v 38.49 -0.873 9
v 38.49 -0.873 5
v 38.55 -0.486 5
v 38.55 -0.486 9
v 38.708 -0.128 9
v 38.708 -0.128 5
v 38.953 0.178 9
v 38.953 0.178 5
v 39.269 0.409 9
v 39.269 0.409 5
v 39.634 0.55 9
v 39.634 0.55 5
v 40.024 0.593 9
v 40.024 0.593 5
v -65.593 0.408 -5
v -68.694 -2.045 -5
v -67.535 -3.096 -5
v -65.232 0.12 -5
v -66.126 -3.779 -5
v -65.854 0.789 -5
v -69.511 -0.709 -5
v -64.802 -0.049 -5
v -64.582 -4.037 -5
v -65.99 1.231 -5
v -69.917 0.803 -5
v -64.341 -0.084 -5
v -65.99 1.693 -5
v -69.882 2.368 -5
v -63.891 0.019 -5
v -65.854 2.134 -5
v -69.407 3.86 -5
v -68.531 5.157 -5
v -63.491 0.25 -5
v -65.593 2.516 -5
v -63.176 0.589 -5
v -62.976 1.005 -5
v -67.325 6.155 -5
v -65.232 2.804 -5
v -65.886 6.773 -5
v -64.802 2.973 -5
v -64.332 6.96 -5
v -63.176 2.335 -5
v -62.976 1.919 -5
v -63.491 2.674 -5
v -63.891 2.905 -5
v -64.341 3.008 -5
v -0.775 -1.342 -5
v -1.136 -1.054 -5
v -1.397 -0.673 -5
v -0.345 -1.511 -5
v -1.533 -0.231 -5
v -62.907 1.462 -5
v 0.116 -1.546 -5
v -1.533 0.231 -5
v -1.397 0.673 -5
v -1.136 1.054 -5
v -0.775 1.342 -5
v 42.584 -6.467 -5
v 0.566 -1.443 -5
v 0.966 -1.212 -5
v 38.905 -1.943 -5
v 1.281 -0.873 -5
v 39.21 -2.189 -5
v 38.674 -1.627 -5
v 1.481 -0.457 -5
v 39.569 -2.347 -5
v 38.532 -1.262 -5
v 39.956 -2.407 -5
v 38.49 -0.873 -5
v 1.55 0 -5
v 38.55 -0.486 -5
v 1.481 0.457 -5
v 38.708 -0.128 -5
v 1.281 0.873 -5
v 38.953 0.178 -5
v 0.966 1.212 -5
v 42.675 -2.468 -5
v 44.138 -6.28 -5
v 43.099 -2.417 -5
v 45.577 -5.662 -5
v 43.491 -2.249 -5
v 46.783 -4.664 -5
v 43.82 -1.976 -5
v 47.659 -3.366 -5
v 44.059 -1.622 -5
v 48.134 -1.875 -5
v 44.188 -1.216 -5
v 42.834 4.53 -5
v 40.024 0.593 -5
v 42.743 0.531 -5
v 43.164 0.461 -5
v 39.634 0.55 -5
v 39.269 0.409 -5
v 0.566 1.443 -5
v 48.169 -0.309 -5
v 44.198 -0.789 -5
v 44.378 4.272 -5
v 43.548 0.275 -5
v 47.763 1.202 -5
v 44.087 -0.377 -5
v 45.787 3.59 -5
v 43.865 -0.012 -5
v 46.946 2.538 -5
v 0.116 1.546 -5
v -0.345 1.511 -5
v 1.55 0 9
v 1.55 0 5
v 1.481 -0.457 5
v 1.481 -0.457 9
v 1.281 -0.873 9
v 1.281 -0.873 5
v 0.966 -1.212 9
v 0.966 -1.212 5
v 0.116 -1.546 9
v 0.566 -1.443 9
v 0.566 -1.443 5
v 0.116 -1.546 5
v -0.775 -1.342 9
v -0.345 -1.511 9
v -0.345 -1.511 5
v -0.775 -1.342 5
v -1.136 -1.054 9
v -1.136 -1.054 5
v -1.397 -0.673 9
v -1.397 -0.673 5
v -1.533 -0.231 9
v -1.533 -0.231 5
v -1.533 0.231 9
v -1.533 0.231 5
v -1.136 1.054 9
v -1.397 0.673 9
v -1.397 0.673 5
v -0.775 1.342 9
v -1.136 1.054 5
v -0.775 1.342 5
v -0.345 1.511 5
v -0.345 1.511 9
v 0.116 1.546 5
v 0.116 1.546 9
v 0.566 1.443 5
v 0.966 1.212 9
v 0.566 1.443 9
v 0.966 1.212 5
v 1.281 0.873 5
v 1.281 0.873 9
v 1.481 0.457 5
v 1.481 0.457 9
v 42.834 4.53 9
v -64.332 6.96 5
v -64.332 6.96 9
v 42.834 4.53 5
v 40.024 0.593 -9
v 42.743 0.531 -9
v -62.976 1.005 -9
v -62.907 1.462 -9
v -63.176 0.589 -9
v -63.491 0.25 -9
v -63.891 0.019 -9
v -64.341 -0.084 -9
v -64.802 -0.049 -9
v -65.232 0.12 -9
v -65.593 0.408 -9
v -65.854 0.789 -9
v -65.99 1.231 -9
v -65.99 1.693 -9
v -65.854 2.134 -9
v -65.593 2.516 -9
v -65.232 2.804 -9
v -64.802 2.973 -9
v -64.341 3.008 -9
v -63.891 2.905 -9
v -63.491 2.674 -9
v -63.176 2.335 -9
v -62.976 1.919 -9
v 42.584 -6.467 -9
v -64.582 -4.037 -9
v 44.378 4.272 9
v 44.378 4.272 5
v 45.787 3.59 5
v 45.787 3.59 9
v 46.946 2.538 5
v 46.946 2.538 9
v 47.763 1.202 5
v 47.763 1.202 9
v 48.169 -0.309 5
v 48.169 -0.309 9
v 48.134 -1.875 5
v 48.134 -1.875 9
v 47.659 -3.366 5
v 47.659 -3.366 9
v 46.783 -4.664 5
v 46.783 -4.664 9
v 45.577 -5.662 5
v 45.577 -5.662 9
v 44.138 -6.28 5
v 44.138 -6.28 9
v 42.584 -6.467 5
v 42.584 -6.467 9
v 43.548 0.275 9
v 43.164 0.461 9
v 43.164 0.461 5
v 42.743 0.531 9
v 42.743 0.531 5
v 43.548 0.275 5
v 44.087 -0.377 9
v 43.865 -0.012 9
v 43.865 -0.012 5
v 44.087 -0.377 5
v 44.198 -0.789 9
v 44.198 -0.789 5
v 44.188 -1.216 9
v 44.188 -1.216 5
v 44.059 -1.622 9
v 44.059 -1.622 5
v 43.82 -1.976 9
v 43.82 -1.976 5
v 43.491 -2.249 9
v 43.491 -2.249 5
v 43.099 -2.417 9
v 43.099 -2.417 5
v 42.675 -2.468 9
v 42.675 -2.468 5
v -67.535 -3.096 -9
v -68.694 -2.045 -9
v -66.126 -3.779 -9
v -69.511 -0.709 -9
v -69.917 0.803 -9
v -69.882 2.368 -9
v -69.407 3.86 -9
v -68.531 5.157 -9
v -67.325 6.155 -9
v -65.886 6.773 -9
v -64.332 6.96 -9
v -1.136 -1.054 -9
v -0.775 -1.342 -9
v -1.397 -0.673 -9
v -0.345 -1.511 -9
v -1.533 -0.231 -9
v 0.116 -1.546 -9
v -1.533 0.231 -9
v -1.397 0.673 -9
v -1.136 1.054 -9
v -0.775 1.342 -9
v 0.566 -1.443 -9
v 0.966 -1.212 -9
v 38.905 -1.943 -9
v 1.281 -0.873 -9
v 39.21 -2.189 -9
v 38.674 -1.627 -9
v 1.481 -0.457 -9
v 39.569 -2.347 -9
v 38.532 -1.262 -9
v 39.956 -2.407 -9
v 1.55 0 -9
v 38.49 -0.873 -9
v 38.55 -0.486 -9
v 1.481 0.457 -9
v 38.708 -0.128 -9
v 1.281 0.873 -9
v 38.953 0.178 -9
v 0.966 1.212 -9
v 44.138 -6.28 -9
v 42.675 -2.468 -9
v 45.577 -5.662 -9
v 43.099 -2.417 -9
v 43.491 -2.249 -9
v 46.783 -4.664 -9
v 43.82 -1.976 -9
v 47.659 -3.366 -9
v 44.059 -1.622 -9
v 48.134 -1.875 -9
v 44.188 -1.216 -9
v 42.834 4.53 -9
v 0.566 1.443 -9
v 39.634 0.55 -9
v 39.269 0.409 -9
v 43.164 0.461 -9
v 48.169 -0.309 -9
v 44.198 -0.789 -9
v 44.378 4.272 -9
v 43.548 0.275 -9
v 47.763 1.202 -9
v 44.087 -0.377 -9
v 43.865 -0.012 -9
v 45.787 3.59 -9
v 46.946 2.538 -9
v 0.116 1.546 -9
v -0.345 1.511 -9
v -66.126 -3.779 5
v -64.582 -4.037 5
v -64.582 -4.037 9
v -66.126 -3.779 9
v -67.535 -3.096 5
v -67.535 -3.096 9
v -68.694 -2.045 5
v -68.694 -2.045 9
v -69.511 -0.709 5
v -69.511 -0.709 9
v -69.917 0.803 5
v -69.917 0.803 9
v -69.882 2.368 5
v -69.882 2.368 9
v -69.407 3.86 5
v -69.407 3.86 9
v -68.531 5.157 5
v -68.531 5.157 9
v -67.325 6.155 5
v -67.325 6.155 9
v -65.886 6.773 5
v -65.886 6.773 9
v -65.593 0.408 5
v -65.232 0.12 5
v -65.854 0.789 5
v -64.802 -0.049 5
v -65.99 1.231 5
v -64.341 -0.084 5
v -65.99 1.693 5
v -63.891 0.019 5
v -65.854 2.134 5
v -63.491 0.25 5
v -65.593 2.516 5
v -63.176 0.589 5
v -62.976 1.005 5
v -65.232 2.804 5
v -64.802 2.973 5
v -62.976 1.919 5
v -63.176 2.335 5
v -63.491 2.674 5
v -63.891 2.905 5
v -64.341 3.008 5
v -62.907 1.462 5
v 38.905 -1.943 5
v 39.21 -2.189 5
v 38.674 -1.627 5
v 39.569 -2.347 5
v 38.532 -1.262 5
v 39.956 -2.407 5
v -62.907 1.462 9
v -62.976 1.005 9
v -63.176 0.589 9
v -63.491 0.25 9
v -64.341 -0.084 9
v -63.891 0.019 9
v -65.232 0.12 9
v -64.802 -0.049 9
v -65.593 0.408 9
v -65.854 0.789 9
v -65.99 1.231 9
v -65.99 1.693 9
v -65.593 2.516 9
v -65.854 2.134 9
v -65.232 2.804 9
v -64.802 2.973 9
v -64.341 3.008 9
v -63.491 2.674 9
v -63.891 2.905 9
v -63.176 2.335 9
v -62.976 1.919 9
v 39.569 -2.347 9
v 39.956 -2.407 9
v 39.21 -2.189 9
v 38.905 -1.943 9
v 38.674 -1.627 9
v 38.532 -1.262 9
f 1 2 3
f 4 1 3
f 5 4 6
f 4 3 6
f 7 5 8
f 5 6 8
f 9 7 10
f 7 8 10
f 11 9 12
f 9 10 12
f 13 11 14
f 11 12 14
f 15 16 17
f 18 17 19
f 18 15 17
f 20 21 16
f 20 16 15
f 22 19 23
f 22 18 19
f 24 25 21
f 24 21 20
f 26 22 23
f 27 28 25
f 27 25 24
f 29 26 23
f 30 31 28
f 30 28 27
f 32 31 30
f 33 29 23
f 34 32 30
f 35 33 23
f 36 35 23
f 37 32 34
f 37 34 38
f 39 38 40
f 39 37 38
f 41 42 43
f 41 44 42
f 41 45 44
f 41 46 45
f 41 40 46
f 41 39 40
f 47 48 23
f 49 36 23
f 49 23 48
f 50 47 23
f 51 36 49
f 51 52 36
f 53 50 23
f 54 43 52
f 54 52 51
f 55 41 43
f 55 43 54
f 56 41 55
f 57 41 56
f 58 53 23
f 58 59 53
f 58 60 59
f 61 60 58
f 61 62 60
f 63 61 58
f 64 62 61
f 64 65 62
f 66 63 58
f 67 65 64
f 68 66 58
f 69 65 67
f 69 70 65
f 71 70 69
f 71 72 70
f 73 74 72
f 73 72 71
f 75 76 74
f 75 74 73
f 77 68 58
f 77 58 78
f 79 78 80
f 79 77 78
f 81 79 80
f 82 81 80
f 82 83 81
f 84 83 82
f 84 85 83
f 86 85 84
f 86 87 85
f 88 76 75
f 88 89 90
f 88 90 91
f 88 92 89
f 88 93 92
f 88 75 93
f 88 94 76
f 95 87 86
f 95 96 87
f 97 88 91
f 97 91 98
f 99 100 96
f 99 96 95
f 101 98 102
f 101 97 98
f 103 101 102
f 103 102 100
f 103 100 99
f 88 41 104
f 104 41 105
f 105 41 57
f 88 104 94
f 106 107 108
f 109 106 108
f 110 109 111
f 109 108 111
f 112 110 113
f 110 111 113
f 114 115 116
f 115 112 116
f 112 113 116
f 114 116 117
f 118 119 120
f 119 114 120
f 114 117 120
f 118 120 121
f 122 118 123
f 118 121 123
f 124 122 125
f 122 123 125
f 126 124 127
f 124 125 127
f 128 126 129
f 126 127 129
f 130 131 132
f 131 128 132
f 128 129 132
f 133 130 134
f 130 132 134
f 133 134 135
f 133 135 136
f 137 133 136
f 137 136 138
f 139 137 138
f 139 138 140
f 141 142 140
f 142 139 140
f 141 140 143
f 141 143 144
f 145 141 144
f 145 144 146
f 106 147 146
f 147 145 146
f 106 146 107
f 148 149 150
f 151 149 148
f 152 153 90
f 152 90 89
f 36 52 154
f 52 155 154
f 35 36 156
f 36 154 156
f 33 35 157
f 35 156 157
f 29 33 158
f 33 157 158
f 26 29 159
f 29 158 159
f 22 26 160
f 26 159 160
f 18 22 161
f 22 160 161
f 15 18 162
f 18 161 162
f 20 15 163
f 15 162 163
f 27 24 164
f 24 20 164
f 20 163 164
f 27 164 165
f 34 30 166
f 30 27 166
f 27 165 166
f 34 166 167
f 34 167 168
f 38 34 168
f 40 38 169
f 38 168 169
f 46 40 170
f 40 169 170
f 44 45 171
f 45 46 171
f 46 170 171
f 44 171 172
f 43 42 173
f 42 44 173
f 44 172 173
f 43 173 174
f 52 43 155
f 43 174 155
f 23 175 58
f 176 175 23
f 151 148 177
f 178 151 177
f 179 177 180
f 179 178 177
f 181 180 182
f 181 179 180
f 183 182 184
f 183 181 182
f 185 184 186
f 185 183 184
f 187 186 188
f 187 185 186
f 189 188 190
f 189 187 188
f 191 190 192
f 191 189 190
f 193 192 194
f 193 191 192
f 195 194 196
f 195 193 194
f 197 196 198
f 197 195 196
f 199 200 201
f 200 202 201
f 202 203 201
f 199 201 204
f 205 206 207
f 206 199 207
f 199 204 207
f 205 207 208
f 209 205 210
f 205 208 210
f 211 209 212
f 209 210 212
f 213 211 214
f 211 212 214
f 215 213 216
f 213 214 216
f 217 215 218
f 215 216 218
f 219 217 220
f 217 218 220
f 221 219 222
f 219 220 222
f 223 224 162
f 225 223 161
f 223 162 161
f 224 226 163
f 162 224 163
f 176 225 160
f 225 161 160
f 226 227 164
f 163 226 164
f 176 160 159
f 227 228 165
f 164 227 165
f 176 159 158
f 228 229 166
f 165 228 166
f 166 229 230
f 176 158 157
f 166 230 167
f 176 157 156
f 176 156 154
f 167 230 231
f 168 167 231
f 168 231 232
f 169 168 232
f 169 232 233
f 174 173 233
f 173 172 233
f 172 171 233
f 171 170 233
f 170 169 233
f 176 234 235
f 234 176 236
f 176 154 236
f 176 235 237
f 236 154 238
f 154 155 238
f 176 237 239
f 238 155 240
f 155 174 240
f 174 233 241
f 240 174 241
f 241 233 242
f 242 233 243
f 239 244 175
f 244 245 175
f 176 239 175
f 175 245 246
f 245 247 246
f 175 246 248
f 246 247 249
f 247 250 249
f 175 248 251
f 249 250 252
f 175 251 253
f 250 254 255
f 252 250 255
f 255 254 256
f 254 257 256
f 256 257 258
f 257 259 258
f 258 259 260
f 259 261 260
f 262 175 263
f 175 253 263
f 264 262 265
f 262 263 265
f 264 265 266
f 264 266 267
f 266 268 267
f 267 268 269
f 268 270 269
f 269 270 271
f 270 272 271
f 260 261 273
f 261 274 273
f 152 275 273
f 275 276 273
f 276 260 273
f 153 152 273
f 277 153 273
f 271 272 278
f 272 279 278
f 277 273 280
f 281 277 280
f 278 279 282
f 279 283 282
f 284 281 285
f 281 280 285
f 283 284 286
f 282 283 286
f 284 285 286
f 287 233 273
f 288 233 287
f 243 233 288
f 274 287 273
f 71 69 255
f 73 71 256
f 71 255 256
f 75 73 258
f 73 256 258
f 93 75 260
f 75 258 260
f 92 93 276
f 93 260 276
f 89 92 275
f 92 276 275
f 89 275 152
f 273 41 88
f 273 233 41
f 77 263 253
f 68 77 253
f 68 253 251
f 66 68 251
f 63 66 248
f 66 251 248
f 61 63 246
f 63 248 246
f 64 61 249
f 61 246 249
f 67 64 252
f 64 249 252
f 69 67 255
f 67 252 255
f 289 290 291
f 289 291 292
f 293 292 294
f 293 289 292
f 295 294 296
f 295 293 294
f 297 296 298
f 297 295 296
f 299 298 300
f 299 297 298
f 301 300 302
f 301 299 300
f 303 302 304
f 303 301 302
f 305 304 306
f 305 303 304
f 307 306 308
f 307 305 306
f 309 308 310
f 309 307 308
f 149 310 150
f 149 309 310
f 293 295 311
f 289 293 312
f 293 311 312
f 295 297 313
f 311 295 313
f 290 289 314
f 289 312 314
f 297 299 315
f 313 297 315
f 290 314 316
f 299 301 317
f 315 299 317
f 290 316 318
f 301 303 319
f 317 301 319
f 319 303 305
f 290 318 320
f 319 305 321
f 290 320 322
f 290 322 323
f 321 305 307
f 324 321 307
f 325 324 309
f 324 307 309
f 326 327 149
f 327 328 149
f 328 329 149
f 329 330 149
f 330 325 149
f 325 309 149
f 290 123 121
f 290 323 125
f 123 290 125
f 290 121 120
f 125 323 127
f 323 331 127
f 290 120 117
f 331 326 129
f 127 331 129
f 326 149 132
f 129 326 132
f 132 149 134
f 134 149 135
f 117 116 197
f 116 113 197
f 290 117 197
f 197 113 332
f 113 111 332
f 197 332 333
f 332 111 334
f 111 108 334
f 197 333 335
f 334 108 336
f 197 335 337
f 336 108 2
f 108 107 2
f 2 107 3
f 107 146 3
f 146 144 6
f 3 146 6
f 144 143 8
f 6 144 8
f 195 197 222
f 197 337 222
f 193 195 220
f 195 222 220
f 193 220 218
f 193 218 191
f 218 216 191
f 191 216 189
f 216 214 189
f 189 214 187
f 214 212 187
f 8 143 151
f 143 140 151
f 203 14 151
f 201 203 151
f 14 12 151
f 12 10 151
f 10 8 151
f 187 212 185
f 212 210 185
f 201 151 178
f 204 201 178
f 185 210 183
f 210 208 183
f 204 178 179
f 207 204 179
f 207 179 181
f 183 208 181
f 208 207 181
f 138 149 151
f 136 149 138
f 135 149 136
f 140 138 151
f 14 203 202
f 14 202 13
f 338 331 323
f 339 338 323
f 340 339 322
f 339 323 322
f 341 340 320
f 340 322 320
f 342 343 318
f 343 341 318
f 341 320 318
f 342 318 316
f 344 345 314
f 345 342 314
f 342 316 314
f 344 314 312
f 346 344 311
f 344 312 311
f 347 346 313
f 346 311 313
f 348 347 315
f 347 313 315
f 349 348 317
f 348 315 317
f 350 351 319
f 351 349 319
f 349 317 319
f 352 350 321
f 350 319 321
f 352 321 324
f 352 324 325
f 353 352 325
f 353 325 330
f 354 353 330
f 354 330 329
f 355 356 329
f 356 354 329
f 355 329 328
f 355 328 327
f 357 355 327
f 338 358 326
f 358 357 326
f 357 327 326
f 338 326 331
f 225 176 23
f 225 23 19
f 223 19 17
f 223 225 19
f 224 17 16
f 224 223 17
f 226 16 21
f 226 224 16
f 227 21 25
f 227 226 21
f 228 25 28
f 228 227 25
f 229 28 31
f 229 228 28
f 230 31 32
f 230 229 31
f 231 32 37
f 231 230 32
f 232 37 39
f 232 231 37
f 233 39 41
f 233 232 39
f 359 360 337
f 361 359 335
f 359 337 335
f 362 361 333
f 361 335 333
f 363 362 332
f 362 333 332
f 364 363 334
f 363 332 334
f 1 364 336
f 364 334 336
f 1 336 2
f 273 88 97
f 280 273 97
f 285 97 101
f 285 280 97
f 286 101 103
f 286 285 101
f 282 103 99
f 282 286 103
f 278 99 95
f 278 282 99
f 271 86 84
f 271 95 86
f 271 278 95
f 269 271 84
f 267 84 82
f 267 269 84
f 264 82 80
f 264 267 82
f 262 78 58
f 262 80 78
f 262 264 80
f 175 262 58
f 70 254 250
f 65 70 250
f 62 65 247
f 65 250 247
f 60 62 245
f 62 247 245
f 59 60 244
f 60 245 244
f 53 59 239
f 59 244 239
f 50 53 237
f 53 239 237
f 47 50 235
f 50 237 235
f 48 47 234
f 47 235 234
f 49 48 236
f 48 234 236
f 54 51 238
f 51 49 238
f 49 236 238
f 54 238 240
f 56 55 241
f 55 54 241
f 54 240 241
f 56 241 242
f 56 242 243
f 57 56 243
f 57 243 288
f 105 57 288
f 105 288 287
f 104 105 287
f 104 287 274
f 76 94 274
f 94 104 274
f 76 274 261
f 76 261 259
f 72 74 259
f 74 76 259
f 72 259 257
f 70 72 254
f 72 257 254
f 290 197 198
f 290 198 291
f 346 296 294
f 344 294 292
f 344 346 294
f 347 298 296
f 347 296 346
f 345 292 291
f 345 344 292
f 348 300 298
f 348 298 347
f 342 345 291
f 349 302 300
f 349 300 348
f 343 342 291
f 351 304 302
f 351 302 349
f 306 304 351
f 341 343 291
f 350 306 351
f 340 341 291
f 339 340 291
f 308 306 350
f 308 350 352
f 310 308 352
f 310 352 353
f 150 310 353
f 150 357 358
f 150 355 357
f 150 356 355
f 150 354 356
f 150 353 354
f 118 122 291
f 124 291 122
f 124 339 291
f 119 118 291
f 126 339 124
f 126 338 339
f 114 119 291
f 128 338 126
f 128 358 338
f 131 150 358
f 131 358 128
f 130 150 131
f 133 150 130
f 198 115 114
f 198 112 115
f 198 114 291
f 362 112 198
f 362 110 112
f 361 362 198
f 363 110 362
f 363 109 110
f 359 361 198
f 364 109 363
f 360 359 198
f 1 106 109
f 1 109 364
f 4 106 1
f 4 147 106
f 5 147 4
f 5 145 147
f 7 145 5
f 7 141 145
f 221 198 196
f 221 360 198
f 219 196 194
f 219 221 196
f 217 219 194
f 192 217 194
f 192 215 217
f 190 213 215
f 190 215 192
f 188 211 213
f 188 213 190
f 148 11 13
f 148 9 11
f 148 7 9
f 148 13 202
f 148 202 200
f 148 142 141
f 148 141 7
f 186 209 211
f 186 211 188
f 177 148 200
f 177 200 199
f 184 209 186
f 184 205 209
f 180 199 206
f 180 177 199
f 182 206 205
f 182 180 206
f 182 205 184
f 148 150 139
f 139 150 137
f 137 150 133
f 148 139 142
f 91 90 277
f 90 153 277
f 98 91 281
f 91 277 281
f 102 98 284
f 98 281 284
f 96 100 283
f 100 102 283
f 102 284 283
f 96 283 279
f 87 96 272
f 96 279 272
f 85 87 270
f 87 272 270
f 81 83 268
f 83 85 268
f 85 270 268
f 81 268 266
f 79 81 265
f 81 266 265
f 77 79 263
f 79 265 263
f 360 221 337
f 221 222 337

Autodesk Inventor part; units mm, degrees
ref_plane "YZ Plane" through (0, 0, 0) normal (1, 0, 0) x (0, 1, 0)
ref_plane "XZ Plane" through (0, 0, 0) normal (0, 1, 0) x (-1, 0, 0)
ref_plane "XY Plane" through (0, 0, 0) normal (0, 0, 1) x (1, 0, 0)
sketch "Sketch1" plane through (0, 0, 0) normal (0, 0, 1) x (1, 0, 0)
  line L0 (0, 0) -> (-64.457, 1.4619) construction
  line L1 (0, 0) -> (42.709, -0.9686) construction
  line L2 (40.3298, 14.0892) -> (39.9897, -0.907) construction
  circle A0 centre (-64.457, 1.4619) radius 1.55
  arc A1 (-64.5818, -4.0367) -> (-64.3323, 6.9605) centre (-64.457, 1.4619) ccw construction
  arc A2 (42.743, 0.531) -> (42.675, -2.4682) centre (42.709, -0.9686) ccw construction
  arc A3 (38.4901, -0.8729) -> (39.9557, -2.4066) centre (39.9897, -0.907) ccw
  arc A4 (42.8337, 4.53) -> (42.5843, -6.4672) centre (42.709, -0.9686) ccw construction
  line L3 (-64.3323, 6.9605) -> (42.8337, 4.53)
  line L4 (42.5843, -6.4672) -> (-64.5818, -4.0367)
  line L5 (42.743, 0.531) -> (40.0237, 0.5927)
  line L6 (42.675, -2.4682) -> (39.9557, -2.4066)
  arc A5 (42.675, -2.4682) -> (42.743, 0.531) centre (42.709, -0.9686) ccw
  arc A6 (40.0237, 0.5927) -> (38.4901, -0.8729) centre (39.9897, -0.907) ccw
  arc A7 (39.9557, -2.4066) -> (40.0237, 0.5927) centre (39.9897, -0.907) ccw construction
  arc A8 (42.5843, -6.4672) -> (42.8337, 4.53) centre (42.709, -0.9686) ccw
  arc A9 (-64.3323, 6.9605) -> (-64.5818, -4.0367) centre (-64.457, 1.4619) ccw
  circle A10 centre (0, 0) radius 1.55
  dimension "d0" = 3
  dimension "d1" = 11
  dimension "d13" = 3.1
extrude "Extrusion1" add sketch "Sketch1" along normal mid plane 18
sketch "Sketch2" plane through (0, 0, 0) normal (0, 0, 1) x (1, 0, 0)
  arc A0 (42.675, -2.4682) -> (42.743, 0.531) centre (42.709, -0.9686) ccw projected
  line L0 (42.675, -2.4682) -> (39.9557, -2.4066) projected
  arc A1 (40.0237, 0.5927) -> (39.9557, -2.4066) centre (39.9897, -0.907) ccw projected
  line L1 (40.0237, 0.5927) -> (42.743, 0.531) projected
  circle A2 centre (0, 0) radius 1.55 projected
  circle A3 centre (-64.457, 1.4619) radius 1.55 projected
  line L2 (42.8337, 4.53) -> (-64.3323, 6.9605) projected
  arc A4 (-64.3323, 6.9605) -> (-64.5818, -4.0367) centre (-64.457, 1.4619) ccw projected
  line L3 (-64.5818, -4.0367) -> (42.5843, -6.4672) projected
  arc A5 (42.5843, -6.4672) -> (42.8337, 4.53) centre (42.709, -0.9686) ccw projected
extrude "Extrusion2" cut sketch "Sketch2" along normal mid plane 10
sketch "Sketch3" plane through (0, 0, 0) normal (0, 1, 0) x (-1, 0, 0)
  arc A0 (-43.8823, -9.7559) -> (-42.7176, -10.1422) centre (-40, 0) ccw
  line L0 (-40, 0) -> (0, 0) construction
  arc A1 (-43.8823, -14.4889) -> (-43.8823, 14.4889) centre (-40, 0) ccw construction
  line L1 (-40, 0) -> (-43.8823, -14.4889)
  line L2 (-40, 0) -> (-43.8823, 14.4889)
  line L3 (-43.8823, -14.4889) -> (-43.8823, 14.4889) construction
  arc A2 (-43.8823, 14.4889) -> (-43.8823, -14.4889) centre (-40, 0) ccw
  arc A3 (-43.8823, 9.7559) -> (-43.8823, -9.7559) centre (-40, 0) ccw
  arc A4 (-42.7176, -10.1422) -> (-42.7176, 10.1422) centre (-40, 0) ccw construction
  arc A5 (-42.7176, 10.1422) -> (-43.8823, 9.7559) centre (-40, 0) ccw
  dimension "d6" = 40
  dimension "d8" = 30
  dimension "d9" = 10.5
  dimension "d10" = 150
extrude "Extrusion3" [suppressed]
properties part number "biela-dedo-3"
